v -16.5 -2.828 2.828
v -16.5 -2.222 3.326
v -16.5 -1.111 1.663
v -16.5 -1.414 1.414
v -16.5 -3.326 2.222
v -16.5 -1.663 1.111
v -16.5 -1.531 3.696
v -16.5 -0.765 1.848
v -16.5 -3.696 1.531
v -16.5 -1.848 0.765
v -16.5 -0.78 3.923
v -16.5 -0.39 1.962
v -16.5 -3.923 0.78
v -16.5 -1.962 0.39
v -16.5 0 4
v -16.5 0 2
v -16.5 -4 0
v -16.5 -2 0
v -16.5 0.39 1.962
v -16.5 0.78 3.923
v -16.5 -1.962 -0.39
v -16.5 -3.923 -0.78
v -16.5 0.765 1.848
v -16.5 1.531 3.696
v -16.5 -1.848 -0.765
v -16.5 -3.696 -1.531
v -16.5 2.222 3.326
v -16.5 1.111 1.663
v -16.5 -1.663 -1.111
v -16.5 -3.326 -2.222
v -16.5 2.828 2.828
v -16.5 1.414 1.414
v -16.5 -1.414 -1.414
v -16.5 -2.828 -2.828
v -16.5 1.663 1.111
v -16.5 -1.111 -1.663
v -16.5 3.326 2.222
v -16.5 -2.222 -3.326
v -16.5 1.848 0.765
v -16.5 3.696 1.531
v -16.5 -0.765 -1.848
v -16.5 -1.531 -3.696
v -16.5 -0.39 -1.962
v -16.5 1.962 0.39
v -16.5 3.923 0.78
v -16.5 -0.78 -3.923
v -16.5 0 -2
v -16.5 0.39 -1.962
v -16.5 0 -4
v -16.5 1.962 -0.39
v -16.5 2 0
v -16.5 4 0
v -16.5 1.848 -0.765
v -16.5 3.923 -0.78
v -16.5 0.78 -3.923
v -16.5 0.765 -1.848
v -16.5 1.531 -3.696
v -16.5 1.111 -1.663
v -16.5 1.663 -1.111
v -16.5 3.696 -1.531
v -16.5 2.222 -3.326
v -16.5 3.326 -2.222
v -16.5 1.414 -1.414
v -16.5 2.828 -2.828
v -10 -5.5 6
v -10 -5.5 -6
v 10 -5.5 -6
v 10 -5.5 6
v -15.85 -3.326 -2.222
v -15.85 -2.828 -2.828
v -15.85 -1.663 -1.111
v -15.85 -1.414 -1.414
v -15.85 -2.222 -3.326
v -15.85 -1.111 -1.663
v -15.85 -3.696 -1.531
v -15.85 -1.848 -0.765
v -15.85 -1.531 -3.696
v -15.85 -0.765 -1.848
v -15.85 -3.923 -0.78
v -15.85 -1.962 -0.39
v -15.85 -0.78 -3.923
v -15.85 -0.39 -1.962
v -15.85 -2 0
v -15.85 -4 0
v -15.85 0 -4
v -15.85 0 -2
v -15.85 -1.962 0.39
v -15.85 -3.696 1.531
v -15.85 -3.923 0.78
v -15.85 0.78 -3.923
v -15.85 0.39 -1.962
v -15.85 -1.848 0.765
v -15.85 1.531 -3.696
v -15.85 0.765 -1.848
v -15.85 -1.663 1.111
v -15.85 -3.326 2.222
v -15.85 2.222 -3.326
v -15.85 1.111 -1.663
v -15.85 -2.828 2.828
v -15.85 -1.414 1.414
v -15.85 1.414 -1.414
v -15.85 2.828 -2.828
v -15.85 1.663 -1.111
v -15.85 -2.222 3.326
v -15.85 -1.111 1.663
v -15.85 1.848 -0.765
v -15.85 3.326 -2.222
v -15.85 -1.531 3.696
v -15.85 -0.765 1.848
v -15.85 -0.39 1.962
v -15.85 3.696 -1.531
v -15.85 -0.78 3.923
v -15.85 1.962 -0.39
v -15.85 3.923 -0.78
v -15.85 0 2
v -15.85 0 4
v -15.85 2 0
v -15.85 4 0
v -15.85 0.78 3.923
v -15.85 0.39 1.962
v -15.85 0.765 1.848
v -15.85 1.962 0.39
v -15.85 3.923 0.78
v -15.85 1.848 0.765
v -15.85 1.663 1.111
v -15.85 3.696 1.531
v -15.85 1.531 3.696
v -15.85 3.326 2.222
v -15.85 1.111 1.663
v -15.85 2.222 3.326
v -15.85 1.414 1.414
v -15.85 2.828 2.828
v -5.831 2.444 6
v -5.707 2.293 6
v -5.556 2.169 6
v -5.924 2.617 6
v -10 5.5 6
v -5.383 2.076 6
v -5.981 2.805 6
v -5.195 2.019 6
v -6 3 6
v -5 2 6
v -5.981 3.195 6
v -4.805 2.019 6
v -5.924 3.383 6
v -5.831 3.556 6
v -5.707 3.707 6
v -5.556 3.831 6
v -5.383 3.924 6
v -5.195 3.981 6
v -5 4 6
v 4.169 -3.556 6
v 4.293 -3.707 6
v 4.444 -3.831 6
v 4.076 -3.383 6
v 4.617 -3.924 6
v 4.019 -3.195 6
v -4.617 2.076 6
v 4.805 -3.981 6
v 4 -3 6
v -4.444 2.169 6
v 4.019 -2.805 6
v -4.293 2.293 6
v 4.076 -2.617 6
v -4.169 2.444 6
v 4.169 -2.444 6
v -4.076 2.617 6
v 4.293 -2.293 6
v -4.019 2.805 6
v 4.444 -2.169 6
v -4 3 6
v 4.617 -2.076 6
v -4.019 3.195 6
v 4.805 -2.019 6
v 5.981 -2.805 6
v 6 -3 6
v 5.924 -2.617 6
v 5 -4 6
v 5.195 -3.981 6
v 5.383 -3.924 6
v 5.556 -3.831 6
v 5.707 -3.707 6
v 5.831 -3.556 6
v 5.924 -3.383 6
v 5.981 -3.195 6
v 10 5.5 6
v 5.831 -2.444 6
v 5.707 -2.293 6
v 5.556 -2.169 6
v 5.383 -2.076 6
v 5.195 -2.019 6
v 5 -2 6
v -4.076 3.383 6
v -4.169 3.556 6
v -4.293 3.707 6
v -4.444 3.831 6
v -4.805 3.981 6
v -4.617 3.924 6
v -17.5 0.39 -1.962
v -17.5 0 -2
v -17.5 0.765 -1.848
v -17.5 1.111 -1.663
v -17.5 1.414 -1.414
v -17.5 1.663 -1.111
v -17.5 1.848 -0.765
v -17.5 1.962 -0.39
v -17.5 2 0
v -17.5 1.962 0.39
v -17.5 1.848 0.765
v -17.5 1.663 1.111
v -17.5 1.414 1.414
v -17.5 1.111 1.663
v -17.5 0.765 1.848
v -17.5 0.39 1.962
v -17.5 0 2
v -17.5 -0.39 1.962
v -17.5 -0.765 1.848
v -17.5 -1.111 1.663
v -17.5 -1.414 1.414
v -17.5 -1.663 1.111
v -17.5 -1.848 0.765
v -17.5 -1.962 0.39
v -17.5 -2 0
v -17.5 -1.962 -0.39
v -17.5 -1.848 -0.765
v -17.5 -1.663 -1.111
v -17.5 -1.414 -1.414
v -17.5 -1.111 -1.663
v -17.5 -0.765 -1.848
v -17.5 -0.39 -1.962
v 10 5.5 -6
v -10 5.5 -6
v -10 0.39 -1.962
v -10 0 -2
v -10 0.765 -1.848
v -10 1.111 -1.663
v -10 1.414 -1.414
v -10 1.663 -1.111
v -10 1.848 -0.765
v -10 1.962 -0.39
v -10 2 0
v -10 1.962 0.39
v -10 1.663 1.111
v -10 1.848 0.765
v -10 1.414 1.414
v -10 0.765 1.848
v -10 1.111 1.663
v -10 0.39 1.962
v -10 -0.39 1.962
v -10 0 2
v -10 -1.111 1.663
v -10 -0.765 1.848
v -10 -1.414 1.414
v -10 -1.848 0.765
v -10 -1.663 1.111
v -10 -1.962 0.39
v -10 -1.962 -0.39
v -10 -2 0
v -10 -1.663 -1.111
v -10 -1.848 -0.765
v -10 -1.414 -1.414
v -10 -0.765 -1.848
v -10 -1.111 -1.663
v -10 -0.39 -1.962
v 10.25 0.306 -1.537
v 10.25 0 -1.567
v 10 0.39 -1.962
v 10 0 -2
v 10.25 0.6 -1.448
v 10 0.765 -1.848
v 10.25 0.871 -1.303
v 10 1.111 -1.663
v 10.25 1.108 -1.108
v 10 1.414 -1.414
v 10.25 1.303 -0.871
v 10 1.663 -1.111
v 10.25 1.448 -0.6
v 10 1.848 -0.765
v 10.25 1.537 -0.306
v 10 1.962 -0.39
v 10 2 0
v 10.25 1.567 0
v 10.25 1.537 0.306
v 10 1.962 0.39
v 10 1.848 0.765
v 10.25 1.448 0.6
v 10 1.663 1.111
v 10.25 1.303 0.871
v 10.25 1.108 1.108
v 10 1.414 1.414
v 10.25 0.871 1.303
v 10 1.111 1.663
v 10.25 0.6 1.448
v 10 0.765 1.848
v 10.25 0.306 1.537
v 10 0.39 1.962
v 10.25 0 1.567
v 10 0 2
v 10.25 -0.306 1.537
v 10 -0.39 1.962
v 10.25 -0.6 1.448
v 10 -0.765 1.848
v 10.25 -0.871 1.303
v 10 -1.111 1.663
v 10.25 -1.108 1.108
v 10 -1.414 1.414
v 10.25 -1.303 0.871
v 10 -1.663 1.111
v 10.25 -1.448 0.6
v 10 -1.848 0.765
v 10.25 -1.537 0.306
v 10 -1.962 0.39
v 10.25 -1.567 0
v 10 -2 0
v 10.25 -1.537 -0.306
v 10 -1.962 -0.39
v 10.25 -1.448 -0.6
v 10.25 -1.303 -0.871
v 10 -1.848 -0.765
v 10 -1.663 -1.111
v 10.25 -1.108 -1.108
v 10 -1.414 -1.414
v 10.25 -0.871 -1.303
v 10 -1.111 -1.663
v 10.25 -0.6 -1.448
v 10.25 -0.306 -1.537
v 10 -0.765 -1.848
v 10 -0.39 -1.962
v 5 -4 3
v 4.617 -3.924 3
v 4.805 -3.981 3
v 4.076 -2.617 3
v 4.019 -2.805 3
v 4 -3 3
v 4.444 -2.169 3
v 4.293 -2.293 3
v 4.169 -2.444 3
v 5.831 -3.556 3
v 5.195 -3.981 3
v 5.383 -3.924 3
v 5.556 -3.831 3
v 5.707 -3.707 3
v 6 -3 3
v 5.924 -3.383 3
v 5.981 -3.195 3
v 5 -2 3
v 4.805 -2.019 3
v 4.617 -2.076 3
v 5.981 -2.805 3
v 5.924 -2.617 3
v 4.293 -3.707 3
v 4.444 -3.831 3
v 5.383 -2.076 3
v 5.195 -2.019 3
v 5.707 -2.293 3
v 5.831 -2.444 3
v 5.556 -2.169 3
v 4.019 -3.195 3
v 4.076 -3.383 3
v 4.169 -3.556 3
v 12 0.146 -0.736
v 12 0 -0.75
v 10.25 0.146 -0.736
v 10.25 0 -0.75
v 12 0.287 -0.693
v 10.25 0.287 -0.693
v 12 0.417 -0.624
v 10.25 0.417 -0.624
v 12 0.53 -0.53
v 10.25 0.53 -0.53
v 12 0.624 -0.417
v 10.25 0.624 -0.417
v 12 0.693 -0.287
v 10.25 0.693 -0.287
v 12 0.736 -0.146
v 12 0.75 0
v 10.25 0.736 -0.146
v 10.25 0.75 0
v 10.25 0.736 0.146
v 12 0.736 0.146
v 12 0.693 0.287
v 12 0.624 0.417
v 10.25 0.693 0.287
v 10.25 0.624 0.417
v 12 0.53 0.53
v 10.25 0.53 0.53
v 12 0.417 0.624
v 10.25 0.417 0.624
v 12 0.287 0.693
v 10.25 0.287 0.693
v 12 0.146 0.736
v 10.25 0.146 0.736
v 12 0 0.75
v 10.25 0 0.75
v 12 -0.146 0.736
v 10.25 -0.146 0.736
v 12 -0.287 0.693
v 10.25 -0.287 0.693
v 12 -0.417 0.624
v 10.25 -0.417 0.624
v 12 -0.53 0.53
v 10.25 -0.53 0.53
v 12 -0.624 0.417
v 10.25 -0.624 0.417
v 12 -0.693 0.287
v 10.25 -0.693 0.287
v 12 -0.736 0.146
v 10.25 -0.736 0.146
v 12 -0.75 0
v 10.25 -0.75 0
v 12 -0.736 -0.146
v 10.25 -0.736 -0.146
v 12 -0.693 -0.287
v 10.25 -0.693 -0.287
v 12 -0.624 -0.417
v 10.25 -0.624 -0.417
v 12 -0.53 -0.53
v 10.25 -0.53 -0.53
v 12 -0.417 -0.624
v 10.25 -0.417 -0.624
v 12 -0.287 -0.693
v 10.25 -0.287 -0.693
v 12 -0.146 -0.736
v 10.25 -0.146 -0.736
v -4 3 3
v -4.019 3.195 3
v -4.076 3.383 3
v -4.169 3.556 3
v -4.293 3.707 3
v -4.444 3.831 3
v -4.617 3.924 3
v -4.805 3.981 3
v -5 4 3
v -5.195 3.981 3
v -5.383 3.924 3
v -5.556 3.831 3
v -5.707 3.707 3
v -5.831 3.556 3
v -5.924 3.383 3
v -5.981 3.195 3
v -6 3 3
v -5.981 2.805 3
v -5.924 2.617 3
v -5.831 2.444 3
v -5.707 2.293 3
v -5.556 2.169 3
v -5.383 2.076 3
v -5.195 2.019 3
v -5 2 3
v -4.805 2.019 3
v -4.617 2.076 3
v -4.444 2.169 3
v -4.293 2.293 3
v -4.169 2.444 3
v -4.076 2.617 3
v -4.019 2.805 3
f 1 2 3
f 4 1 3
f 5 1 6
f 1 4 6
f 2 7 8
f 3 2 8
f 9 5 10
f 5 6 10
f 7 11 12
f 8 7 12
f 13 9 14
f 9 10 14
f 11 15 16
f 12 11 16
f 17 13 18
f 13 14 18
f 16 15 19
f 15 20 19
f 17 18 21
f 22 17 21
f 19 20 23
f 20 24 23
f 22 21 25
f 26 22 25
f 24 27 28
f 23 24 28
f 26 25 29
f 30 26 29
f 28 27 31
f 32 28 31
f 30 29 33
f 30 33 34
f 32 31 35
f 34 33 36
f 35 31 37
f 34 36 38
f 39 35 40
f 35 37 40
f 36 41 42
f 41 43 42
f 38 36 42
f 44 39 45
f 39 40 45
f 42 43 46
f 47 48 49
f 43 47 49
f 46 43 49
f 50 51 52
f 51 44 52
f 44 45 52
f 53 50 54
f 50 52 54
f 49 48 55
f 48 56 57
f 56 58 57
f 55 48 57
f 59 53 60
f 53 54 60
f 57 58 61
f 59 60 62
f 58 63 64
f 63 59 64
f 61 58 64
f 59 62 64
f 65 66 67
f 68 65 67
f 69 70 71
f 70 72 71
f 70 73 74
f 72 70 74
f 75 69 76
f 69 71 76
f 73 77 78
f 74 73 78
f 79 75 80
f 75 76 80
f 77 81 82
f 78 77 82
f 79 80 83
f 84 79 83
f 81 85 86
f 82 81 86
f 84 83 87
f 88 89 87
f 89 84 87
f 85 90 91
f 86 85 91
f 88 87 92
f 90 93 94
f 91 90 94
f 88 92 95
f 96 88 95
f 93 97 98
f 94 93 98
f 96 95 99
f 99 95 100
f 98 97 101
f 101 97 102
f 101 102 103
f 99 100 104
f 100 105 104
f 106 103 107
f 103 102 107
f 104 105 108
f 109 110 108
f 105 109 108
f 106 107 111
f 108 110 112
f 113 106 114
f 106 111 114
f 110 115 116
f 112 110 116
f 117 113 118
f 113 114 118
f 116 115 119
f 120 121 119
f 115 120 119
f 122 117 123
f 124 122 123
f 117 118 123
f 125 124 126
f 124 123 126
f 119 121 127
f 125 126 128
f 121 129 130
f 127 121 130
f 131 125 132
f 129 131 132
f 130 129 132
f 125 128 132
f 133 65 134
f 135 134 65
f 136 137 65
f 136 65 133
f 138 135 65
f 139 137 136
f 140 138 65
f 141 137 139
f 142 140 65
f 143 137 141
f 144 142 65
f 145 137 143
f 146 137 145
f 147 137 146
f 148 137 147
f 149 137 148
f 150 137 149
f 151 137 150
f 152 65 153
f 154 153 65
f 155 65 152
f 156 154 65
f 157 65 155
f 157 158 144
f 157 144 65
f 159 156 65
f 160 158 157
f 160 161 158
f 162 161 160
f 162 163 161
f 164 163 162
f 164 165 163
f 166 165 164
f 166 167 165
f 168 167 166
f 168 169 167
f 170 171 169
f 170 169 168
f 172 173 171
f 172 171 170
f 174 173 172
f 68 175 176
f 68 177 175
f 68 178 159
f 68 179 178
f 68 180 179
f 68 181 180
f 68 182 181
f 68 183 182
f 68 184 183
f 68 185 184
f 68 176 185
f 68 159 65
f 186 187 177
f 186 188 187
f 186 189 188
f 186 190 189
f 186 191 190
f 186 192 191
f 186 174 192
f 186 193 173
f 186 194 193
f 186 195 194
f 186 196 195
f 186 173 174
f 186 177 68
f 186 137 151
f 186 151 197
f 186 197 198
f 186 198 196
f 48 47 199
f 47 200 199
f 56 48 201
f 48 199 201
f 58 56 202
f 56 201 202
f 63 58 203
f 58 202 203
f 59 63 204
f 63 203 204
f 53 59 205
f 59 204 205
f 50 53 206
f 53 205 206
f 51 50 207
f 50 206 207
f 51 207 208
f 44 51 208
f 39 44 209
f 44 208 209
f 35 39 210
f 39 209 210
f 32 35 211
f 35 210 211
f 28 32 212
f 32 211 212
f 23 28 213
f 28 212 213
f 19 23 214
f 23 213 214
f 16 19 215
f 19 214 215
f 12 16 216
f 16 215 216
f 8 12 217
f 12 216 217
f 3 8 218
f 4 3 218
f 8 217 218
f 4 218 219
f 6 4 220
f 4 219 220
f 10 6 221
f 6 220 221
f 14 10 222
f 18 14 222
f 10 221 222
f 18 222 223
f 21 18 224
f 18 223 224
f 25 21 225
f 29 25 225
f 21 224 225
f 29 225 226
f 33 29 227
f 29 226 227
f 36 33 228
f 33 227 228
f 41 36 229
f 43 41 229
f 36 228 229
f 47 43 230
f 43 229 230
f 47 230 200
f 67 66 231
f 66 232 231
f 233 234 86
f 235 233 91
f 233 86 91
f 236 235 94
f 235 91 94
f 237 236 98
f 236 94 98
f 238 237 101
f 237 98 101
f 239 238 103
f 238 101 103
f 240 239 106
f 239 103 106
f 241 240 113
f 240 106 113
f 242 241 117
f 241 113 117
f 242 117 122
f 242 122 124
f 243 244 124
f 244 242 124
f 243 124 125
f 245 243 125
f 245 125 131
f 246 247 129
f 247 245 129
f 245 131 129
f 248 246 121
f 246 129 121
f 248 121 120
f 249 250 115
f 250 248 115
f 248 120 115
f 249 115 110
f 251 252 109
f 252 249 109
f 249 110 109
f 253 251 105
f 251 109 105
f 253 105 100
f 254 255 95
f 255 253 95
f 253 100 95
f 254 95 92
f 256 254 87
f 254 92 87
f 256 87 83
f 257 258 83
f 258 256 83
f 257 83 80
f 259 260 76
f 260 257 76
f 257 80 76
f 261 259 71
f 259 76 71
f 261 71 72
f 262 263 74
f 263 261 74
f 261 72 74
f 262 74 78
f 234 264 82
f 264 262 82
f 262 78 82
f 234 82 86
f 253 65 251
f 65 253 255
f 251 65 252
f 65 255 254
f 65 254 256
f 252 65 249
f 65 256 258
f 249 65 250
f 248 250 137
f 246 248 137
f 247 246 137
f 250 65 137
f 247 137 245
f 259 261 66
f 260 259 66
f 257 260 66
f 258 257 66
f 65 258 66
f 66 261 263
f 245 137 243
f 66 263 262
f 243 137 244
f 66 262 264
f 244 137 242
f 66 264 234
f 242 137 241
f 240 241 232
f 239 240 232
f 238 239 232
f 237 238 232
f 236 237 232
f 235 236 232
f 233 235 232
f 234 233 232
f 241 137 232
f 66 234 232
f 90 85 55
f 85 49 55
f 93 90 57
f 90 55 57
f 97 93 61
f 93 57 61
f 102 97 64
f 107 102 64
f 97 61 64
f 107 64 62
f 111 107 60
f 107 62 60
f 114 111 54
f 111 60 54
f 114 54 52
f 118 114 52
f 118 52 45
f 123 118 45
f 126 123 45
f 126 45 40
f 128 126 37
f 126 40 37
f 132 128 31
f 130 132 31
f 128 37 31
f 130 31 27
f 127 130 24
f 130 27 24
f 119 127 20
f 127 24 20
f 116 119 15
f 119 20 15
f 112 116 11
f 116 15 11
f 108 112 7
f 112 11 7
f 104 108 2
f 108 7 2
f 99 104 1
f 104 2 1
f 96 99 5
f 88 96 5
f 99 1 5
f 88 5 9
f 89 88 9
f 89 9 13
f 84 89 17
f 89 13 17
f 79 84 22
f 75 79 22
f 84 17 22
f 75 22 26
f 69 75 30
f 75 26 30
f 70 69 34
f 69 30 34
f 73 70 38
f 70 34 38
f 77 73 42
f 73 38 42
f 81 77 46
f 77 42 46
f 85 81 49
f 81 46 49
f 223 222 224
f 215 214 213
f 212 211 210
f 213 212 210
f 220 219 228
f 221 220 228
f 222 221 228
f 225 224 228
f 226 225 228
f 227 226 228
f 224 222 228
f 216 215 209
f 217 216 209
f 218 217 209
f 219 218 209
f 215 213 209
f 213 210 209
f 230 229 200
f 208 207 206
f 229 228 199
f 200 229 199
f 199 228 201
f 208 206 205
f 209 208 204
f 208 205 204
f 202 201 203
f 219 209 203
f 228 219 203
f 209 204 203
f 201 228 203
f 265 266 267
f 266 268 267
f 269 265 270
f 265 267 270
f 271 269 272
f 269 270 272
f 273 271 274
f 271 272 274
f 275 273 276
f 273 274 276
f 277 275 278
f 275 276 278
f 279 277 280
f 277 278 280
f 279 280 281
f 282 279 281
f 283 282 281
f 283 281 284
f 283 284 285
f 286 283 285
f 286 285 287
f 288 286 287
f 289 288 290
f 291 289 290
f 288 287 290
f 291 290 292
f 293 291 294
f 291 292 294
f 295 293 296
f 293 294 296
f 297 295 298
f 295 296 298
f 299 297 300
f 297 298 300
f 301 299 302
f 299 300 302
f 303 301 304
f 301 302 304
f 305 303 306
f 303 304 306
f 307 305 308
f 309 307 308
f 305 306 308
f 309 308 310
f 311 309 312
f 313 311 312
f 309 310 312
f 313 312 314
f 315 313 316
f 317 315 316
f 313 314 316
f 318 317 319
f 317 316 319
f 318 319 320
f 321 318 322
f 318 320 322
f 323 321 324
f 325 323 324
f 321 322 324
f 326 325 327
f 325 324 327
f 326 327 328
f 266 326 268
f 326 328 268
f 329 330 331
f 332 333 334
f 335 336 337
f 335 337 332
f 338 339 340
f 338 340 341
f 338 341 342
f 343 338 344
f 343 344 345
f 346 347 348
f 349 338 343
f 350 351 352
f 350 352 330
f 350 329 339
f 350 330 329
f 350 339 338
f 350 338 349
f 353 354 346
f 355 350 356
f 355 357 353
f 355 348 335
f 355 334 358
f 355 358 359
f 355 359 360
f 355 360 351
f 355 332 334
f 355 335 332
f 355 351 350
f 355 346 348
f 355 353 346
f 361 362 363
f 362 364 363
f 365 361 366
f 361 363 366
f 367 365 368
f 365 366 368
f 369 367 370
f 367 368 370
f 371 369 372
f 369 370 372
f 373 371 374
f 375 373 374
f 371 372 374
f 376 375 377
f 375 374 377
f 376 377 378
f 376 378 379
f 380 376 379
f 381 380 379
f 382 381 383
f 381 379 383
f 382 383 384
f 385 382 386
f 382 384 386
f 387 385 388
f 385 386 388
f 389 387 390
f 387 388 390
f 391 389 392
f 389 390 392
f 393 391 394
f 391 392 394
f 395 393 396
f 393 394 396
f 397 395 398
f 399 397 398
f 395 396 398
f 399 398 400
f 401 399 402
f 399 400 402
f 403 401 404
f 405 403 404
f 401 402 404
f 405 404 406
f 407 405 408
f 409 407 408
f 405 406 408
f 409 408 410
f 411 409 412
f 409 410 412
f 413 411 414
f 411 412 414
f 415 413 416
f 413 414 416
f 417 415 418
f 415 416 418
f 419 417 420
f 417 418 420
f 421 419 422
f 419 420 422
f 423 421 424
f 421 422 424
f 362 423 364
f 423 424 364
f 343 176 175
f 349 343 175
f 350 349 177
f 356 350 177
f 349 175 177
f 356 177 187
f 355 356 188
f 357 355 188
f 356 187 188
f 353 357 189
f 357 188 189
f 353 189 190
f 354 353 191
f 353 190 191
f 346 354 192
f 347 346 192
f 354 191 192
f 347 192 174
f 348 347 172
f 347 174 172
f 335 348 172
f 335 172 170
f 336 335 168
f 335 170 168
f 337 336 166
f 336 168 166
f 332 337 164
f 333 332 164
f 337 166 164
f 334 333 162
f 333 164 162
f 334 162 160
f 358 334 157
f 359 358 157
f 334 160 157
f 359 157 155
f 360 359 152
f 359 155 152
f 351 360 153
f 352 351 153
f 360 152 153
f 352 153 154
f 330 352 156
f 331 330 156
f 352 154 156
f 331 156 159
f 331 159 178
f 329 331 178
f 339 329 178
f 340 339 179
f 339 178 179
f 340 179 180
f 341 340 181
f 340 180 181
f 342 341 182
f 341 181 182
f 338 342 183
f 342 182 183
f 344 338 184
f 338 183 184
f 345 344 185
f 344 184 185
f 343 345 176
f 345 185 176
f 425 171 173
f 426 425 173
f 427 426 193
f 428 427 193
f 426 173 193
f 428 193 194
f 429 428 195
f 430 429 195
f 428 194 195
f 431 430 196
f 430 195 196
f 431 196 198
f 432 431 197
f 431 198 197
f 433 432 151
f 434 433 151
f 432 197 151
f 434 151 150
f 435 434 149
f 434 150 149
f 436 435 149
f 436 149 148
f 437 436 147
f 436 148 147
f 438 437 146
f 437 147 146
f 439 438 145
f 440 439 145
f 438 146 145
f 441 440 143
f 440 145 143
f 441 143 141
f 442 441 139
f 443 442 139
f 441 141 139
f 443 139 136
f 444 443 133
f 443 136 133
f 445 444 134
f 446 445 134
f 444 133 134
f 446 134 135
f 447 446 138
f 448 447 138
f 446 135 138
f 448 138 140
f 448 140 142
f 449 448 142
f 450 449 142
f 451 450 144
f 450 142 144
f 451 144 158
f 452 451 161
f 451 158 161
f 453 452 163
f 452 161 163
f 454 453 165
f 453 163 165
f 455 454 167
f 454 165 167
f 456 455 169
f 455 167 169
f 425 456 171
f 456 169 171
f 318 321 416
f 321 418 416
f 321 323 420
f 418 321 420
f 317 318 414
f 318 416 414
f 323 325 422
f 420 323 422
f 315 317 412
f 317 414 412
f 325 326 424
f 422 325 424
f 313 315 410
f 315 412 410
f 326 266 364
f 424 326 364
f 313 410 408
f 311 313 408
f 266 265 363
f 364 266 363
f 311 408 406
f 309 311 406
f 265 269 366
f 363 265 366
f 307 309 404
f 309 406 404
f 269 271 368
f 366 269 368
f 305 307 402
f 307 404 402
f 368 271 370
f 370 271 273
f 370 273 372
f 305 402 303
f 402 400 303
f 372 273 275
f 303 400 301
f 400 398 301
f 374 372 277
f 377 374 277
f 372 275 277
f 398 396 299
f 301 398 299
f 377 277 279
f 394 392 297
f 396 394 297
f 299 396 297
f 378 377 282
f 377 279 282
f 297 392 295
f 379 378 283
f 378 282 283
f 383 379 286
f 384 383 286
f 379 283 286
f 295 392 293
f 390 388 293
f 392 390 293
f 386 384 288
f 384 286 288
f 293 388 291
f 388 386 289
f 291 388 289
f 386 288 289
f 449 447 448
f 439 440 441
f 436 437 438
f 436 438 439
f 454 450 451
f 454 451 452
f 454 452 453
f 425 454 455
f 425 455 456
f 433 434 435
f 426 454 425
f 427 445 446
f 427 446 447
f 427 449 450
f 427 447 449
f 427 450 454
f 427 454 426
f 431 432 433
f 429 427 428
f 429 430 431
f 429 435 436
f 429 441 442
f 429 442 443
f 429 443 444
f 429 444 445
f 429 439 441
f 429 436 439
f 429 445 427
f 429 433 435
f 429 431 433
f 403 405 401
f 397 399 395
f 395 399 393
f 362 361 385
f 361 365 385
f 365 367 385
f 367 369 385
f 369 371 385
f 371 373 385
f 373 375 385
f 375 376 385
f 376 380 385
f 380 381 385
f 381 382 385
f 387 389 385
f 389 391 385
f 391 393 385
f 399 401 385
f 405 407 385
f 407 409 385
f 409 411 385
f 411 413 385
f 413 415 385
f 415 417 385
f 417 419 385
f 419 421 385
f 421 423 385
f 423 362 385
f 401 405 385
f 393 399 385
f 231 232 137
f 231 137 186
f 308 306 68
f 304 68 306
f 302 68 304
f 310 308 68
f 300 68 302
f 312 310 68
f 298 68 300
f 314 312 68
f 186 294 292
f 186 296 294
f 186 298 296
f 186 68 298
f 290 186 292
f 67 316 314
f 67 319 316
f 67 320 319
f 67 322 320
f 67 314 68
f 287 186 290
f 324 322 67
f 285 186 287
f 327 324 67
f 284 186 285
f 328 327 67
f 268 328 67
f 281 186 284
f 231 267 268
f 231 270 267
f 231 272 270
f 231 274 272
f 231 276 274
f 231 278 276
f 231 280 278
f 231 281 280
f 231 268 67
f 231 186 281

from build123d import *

# Parameters (mm, degrees)
SKETCH1_W           = 20
SKETCH1_H           = 12
BOSS_EXTRUDE1_DEPTH = 5.5
SKETCH2_R           = 1
CUT_EXTRUDE1_DEPTH  = 3


with BuildPart() as part:
    # Sketch1 → Boss-Extrude1 (new body, symmetric)
    with BuildSketch(Plane(origin=(0, 0, 0), x_dir=(1, 0, 0), z_dir=(0, 1, 0))):
        Rectangle(SKETCH1_W, SKETCH1_H)
    extrude(amount=BOSS_EXTRUDE1_DEPTH, both=True)

    # Sketch2 → Cut-Extrude1 (cut)
    with BuildSketch(Plane.XY.offset(6)):
        with Locations((5, -3)):
            Circle(SKETCH2_R)
        with Locations((-5, 3)):
            Circle(SKETCH2_R)
    extrude(amount=-CUT_EXTRUDE1_DEPTH, mode=Mode.SUBTRACT)

    # Sketch3 → Revolve1 (revolve)
    with BuildSketch(Plane(origin=(0, 0, 0), x_dir=(1, 0, 0), z_dir=(0, 1, 0))):
        Polygon((12, 0), (12, 0.75), (10.25, 0.75), (10.25, 1.566987298), (10, 2), (-15.85, 2), (-15.85, 4), (-16.5, 4), (-16.5, 2), (-17.5, 2), (-17.5, 0), align=None)
    revolve(axis=Axis((-17.5, 0, 0), (1, 0, 0)))


solid = part.part
